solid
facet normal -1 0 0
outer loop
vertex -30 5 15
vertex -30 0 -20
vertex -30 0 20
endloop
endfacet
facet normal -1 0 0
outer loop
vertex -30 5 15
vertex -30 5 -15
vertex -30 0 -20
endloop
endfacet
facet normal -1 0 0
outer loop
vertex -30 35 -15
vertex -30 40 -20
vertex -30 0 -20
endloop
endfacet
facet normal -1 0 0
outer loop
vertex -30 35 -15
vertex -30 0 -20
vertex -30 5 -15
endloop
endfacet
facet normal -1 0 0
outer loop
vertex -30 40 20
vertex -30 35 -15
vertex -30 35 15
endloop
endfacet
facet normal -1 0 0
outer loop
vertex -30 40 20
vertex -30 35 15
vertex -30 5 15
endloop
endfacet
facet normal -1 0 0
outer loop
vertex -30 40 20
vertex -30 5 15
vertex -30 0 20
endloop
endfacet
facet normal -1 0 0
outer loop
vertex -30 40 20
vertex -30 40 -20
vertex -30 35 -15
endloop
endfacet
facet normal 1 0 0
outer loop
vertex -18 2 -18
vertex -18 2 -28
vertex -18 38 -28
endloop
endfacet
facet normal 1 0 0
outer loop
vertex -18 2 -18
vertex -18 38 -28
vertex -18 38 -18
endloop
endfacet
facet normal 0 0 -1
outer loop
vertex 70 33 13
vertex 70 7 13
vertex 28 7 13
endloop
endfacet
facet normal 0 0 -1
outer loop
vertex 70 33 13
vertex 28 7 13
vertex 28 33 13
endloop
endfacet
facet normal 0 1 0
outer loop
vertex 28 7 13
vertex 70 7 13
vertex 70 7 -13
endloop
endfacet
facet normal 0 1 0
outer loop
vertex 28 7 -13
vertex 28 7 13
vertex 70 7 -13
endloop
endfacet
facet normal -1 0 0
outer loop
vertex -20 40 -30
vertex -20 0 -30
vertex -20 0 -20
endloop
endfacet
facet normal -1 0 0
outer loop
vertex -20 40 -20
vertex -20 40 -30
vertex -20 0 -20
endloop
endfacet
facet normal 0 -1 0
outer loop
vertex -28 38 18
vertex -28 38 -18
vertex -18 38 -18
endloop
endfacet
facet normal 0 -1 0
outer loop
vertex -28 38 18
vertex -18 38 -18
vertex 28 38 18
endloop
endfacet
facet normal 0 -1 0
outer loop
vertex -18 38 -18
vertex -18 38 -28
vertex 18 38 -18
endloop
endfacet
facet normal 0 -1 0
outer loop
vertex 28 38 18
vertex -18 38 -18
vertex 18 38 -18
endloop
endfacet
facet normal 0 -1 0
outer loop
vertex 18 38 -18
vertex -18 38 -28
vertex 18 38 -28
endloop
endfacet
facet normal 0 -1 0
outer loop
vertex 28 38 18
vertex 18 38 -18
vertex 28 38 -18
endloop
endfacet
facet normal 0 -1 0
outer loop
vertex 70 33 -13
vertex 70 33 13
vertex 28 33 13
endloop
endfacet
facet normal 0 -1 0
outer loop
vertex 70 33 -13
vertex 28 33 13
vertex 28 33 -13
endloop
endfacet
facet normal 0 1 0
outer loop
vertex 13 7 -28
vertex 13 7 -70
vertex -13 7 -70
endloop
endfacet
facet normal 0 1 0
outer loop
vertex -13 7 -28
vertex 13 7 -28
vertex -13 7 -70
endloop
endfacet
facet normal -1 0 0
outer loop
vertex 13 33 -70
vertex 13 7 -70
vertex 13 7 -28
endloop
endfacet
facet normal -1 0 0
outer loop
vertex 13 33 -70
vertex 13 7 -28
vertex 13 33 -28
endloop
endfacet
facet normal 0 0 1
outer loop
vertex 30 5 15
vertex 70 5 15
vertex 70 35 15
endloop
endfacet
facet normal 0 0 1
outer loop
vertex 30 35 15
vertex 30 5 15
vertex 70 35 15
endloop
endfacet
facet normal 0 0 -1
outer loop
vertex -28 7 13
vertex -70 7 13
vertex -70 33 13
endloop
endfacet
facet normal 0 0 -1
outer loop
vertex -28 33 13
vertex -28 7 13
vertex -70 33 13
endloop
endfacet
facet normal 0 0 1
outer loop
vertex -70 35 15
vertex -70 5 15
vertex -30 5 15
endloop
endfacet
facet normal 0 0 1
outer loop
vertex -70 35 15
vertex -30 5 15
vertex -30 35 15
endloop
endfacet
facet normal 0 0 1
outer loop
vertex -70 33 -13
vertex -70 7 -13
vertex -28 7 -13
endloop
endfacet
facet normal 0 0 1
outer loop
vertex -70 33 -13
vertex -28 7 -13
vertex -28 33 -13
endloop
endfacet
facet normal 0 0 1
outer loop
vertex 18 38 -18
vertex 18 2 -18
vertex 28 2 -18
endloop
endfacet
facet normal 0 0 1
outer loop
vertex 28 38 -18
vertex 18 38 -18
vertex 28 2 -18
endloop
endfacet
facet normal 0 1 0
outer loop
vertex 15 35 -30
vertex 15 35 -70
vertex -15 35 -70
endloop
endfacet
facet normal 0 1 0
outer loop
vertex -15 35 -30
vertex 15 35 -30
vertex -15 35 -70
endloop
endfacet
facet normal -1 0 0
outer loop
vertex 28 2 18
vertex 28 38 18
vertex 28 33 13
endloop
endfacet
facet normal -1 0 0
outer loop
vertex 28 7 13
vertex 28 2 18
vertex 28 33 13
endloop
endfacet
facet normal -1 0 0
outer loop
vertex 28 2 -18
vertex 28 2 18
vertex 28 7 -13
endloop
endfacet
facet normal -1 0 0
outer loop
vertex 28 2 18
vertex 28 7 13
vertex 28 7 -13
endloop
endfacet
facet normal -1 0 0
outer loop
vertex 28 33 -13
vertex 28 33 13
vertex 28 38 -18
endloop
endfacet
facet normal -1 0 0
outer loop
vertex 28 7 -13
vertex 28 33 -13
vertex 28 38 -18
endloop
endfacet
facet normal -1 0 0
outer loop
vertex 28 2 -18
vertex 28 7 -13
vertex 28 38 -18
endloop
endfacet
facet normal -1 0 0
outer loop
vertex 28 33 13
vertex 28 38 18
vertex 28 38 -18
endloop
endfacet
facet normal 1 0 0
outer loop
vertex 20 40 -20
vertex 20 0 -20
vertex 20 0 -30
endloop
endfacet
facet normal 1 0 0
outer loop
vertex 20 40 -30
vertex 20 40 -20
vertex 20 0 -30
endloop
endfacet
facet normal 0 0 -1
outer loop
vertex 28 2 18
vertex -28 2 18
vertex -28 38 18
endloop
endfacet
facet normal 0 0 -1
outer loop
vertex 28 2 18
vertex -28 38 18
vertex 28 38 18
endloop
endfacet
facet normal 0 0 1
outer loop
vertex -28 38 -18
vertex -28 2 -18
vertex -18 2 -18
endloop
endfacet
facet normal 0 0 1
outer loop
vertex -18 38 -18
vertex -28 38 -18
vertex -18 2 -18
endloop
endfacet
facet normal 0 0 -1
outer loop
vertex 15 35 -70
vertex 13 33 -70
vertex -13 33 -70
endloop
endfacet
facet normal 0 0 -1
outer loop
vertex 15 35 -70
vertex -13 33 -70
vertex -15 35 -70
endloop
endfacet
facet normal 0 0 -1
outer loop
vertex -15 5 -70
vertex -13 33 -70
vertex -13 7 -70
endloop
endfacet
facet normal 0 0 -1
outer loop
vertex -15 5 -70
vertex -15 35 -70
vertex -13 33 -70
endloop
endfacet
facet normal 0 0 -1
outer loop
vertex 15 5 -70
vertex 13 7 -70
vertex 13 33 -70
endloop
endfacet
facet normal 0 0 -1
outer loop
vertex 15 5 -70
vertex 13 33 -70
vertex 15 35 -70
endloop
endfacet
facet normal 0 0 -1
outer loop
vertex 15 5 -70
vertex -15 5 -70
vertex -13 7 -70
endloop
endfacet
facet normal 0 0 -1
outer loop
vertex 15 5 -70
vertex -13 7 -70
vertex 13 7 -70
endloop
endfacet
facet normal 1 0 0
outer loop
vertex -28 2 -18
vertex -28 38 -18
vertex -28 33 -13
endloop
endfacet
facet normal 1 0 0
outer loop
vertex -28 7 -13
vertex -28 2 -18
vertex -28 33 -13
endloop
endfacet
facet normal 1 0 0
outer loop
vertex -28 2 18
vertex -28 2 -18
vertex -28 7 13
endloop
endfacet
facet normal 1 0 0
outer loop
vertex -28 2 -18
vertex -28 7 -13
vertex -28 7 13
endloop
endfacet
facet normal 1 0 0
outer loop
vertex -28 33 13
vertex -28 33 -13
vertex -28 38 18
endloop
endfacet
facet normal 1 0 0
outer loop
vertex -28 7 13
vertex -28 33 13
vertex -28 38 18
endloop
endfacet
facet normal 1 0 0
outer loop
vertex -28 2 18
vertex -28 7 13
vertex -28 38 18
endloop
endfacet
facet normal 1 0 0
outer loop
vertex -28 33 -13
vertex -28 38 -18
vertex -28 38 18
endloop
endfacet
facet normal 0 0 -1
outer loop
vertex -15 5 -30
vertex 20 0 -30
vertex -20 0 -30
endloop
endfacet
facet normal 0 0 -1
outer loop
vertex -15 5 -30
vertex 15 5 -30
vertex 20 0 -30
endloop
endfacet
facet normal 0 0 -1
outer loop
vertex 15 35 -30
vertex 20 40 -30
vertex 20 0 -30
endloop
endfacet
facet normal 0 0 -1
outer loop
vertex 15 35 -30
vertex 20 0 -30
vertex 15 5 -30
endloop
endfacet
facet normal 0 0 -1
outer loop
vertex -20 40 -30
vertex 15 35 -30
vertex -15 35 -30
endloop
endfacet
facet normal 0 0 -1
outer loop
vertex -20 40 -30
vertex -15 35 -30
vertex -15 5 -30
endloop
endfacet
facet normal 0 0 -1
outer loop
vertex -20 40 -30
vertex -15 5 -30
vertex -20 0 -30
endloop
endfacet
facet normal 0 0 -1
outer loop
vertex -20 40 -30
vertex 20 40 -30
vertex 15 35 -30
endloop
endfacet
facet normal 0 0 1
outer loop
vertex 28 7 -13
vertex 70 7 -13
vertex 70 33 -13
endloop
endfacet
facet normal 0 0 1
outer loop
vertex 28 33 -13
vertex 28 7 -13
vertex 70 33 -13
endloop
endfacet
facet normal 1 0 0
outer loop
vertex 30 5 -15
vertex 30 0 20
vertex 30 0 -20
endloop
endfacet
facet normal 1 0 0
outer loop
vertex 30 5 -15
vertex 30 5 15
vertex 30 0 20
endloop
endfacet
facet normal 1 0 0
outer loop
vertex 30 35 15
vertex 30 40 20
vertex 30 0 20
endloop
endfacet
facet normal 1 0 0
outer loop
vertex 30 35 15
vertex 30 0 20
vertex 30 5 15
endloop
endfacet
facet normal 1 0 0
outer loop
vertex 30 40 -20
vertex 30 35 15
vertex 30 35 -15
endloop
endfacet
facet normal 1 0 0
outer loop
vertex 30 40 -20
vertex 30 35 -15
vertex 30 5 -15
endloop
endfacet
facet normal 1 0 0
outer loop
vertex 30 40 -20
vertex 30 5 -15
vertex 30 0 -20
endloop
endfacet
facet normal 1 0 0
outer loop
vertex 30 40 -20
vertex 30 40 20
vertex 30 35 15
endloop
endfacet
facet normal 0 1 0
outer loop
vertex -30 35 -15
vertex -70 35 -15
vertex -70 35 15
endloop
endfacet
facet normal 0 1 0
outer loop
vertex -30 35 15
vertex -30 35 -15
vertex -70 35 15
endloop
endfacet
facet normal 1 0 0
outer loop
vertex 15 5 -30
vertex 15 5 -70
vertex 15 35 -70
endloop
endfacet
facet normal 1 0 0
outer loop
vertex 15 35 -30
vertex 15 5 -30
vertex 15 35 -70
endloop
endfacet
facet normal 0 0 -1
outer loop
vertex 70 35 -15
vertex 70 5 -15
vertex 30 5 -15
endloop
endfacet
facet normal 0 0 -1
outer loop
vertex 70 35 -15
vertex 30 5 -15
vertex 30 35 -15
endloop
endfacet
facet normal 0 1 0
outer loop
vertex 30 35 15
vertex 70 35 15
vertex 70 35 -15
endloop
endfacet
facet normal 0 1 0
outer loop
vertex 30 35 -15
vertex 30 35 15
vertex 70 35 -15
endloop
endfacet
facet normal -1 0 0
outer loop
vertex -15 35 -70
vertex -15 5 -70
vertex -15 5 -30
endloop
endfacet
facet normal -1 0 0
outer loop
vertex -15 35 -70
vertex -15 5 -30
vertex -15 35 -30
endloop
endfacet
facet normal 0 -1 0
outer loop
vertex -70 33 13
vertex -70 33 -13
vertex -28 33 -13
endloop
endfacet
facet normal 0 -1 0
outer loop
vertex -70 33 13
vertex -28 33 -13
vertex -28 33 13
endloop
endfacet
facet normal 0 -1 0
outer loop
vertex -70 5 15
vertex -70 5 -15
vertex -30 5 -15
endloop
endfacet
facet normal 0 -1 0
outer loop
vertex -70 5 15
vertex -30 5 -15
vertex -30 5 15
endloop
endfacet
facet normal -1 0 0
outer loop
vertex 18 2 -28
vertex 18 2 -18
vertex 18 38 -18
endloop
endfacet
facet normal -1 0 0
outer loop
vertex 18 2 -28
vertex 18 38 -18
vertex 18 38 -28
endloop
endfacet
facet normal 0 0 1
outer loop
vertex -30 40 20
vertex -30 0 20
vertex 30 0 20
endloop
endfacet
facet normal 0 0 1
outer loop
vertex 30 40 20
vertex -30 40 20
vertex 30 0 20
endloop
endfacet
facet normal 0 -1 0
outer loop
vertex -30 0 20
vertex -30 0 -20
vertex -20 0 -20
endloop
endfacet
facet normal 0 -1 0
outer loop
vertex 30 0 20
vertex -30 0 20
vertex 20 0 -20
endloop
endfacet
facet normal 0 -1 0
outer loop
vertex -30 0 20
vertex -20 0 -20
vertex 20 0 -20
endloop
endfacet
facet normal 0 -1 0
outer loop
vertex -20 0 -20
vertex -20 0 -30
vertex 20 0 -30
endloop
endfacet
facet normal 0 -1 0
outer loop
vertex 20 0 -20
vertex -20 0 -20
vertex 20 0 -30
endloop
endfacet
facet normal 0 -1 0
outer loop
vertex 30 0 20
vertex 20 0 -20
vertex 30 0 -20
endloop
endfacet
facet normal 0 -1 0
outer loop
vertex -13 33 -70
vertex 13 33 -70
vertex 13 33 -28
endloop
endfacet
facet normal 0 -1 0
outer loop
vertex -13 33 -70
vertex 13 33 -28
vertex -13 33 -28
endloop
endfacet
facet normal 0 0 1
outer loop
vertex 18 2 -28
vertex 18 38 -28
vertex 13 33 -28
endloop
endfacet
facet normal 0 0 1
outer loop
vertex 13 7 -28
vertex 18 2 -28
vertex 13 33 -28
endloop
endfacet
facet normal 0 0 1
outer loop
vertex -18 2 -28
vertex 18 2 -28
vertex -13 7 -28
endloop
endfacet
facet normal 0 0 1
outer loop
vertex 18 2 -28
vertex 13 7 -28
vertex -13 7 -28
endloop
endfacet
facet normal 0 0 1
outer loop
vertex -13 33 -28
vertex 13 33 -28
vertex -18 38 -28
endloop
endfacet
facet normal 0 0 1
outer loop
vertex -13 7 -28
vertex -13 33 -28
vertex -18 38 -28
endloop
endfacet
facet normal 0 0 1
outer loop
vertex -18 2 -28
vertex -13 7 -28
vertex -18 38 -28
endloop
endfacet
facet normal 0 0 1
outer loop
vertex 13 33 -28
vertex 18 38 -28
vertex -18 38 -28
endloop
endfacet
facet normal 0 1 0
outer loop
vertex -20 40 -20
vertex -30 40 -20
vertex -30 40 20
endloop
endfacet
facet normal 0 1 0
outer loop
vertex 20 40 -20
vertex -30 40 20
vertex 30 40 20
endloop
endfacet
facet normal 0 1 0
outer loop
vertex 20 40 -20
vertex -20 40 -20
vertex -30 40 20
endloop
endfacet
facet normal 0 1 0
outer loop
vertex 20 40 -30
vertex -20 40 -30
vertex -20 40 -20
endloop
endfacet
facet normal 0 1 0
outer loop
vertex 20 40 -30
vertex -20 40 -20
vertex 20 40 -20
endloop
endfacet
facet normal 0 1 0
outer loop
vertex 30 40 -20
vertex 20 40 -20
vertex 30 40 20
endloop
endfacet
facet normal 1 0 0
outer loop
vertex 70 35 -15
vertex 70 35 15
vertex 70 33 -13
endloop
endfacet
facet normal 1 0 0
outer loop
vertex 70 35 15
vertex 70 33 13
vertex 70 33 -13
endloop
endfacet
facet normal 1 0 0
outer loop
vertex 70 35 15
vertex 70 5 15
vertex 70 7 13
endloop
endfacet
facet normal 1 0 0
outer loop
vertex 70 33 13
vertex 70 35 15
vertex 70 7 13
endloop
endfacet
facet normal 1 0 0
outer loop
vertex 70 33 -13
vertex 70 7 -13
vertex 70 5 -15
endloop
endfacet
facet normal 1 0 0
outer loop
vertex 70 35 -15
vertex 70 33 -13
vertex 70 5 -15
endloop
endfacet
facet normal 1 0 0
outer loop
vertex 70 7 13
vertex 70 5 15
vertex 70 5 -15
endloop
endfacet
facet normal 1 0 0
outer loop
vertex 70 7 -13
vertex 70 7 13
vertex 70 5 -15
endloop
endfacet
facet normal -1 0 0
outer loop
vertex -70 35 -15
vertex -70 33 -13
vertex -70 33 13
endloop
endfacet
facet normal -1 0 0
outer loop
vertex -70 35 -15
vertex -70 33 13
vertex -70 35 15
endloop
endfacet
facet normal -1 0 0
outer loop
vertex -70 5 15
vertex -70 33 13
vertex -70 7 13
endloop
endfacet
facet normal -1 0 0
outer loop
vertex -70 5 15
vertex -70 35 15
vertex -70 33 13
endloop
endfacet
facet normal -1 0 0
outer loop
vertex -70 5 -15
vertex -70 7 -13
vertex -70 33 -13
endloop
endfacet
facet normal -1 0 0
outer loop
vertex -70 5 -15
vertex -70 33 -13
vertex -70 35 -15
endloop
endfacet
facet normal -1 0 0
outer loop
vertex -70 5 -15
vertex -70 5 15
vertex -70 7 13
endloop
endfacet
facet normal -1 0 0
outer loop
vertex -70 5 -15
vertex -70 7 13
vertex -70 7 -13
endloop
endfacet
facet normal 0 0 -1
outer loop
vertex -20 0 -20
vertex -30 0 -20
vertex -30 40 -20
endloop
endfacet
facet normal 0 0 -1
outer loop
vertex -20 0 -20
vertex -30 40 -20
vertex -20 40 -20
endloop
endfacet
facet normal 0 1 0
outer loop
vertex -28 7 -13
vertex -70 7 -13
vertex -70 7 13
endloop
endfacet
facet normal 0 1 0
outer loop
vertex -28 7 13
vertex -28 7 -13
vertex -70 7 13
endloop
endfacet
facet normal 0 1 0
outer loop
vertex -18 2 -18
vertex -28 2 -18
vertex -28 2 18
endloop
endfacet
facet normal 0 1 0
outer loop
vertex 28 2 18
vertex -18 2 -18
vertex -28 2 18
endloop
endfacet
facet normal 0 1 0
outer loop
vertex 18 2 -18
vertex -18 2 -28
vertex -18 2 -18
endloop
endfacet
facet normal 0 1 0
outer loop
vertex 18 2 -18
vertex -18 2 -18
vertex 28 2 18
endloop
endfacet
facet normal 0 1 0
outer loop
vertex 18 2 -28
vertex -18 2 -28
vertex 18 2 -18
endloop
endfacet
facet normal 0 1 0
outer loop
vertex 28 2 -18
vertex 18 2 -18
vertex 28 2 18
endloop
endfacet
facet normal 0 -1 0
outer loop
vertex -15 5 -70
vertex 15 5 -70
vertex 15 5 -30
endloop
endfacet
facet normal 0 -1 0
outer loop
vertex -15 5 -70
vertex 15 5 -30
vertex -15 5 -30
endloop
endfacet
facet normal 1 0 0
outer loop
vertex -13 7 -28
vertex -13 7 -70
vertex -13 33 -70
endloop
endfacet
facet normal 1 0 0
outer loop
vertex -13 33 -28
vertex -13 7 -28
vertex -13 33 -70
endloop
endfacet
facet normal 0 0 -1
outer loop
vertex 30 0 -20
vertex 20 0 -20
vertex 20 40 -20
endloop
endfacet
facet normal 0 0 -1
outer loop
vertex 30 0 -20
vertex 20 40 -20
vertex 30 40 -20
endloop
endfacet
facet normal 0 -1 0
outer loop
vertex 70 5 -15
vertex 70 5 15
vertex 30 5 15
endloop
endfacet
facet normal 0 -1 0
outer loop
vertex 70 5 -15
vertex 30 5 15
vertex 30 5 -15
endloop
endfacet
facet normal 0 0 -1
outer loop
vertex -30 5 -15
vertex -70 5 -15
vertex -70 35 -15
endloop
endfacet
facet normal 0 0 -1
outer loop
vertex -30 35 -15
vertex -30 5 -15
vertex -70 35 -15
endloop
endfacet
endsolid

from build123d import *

# Parameters (mm, degrees)
CROQUIS1_W     = 40
CROQUIS1_H     = 50
CROQUIS1_H_2   = 40
CROQUIS1_W_2   = 50
EXTRUIR1_DEPTH = 40
CROQUIS2_W     = 40
CROQUIS2_H     = 40
CROQUIS2_W_2   = 30
CROQUIS2_H_2   = 30
EXTRUIR2_DEPTH = 40
CROQUIS3_W     = 40
CROQUIS3_H     = 40
CROQUIS3_W_2   = 30
CROQUIS3_H_2   = 30
EXTRUIR3_DEPTH = 40
CROQUIS5_W     = 40
CROQUIS5_H     = 40
CROQUIS5_W_2   = 30
CROQUIS5_H_2   = 30
EXTRUIR4_DEPTH = 40
VACIADO1_T     = -2


with BuildPart() as part:
    # Croquis1 → Extruir1 (new body)
    with BuildSketch(Plane(origin=(0, 0, 0), x_dir=(1, 0, 0), z_dir=(0, 1, 0))):
        with Locations((0, 45)):
            Rectangle(CROQUIS1_W, CROQUIS1_H)
        Rectangle(CROQUIS1_W, CROQUIS1_H_2)
        with Locations((45, 0)):
            Rectangle(CROQUIS1_W_2, CROQUIS1_H_2)
        with Locations((-45, 0)):
            Rectangle(CROQUIS1_W_2, CROQUIS1_H_2)
    extrude(amount=EXTRUIR1_DEPTH)

    # Croquis2 → Extruir2 (cut)
    with BuildSketch(Plane(origin=(70, 0, 0), x_dir=(0, 0, -1), z_dir=(1, 0, 0))):
        with Locations((0, 20)):
            Rectangle(CROQUIS2_W, CROQUIS2_H)
        with Locations((0, 20)):
            Rectangle(CROQUIS2_W_2, CROQUIS2_H_2, mode=Mode.SUBTRACT)
    extrude(amount=-EXTRUIR2_DEPTH, mode=Mode.SUBTRACT)

    # Croquis3 → Extruir3 (cut)
    with BuildSketch(Plane(origin=(0, 0, -70), x_dir=(-1, 0, 0), z_dir=(0, 0, -1))):
        with Locations((0, 20)):
            Rectangle(CROQUIS3_W, CROQUIS3_H)
        with Locations((0, 20)):
            Rectangle(CROQUIS3_W_2, CROQUIS3_H_2, mode=Mode.SUBTRACT)
    extrude(amount=-EXTRUIR3_DEPTH, mode=Mode.SUBTRACT)

    # Croquis5 → Extruir4 (cut)
    with BuildSketch(Plane.ZY.offset(70)):
        with Locations((0, 20)):
            Rectangle(CROQUIS5_W, CROQUIS5_H)
        with Locations((0, 20)):
            Rectangle(CROQUIS5_W_2, CROQUIS5_H_2, mode=Mode.SUBTRACT)
    extrude(amount=-EXTRUIR4_DEPTH, mode=Mode.SUBTRACT)

    # Vaciado1
    vaciado1_openings = [part.faces().sort_by_distance(p)[0] for p in [
        (70, 20, 0),
        (0, 20, -70),
        (-70, 20, 0),
    ]]
    offset(amount=VACIADO1_T, openings=vaciado1_openings, kind=Kind.INTERSECTION)


solid = part.part
